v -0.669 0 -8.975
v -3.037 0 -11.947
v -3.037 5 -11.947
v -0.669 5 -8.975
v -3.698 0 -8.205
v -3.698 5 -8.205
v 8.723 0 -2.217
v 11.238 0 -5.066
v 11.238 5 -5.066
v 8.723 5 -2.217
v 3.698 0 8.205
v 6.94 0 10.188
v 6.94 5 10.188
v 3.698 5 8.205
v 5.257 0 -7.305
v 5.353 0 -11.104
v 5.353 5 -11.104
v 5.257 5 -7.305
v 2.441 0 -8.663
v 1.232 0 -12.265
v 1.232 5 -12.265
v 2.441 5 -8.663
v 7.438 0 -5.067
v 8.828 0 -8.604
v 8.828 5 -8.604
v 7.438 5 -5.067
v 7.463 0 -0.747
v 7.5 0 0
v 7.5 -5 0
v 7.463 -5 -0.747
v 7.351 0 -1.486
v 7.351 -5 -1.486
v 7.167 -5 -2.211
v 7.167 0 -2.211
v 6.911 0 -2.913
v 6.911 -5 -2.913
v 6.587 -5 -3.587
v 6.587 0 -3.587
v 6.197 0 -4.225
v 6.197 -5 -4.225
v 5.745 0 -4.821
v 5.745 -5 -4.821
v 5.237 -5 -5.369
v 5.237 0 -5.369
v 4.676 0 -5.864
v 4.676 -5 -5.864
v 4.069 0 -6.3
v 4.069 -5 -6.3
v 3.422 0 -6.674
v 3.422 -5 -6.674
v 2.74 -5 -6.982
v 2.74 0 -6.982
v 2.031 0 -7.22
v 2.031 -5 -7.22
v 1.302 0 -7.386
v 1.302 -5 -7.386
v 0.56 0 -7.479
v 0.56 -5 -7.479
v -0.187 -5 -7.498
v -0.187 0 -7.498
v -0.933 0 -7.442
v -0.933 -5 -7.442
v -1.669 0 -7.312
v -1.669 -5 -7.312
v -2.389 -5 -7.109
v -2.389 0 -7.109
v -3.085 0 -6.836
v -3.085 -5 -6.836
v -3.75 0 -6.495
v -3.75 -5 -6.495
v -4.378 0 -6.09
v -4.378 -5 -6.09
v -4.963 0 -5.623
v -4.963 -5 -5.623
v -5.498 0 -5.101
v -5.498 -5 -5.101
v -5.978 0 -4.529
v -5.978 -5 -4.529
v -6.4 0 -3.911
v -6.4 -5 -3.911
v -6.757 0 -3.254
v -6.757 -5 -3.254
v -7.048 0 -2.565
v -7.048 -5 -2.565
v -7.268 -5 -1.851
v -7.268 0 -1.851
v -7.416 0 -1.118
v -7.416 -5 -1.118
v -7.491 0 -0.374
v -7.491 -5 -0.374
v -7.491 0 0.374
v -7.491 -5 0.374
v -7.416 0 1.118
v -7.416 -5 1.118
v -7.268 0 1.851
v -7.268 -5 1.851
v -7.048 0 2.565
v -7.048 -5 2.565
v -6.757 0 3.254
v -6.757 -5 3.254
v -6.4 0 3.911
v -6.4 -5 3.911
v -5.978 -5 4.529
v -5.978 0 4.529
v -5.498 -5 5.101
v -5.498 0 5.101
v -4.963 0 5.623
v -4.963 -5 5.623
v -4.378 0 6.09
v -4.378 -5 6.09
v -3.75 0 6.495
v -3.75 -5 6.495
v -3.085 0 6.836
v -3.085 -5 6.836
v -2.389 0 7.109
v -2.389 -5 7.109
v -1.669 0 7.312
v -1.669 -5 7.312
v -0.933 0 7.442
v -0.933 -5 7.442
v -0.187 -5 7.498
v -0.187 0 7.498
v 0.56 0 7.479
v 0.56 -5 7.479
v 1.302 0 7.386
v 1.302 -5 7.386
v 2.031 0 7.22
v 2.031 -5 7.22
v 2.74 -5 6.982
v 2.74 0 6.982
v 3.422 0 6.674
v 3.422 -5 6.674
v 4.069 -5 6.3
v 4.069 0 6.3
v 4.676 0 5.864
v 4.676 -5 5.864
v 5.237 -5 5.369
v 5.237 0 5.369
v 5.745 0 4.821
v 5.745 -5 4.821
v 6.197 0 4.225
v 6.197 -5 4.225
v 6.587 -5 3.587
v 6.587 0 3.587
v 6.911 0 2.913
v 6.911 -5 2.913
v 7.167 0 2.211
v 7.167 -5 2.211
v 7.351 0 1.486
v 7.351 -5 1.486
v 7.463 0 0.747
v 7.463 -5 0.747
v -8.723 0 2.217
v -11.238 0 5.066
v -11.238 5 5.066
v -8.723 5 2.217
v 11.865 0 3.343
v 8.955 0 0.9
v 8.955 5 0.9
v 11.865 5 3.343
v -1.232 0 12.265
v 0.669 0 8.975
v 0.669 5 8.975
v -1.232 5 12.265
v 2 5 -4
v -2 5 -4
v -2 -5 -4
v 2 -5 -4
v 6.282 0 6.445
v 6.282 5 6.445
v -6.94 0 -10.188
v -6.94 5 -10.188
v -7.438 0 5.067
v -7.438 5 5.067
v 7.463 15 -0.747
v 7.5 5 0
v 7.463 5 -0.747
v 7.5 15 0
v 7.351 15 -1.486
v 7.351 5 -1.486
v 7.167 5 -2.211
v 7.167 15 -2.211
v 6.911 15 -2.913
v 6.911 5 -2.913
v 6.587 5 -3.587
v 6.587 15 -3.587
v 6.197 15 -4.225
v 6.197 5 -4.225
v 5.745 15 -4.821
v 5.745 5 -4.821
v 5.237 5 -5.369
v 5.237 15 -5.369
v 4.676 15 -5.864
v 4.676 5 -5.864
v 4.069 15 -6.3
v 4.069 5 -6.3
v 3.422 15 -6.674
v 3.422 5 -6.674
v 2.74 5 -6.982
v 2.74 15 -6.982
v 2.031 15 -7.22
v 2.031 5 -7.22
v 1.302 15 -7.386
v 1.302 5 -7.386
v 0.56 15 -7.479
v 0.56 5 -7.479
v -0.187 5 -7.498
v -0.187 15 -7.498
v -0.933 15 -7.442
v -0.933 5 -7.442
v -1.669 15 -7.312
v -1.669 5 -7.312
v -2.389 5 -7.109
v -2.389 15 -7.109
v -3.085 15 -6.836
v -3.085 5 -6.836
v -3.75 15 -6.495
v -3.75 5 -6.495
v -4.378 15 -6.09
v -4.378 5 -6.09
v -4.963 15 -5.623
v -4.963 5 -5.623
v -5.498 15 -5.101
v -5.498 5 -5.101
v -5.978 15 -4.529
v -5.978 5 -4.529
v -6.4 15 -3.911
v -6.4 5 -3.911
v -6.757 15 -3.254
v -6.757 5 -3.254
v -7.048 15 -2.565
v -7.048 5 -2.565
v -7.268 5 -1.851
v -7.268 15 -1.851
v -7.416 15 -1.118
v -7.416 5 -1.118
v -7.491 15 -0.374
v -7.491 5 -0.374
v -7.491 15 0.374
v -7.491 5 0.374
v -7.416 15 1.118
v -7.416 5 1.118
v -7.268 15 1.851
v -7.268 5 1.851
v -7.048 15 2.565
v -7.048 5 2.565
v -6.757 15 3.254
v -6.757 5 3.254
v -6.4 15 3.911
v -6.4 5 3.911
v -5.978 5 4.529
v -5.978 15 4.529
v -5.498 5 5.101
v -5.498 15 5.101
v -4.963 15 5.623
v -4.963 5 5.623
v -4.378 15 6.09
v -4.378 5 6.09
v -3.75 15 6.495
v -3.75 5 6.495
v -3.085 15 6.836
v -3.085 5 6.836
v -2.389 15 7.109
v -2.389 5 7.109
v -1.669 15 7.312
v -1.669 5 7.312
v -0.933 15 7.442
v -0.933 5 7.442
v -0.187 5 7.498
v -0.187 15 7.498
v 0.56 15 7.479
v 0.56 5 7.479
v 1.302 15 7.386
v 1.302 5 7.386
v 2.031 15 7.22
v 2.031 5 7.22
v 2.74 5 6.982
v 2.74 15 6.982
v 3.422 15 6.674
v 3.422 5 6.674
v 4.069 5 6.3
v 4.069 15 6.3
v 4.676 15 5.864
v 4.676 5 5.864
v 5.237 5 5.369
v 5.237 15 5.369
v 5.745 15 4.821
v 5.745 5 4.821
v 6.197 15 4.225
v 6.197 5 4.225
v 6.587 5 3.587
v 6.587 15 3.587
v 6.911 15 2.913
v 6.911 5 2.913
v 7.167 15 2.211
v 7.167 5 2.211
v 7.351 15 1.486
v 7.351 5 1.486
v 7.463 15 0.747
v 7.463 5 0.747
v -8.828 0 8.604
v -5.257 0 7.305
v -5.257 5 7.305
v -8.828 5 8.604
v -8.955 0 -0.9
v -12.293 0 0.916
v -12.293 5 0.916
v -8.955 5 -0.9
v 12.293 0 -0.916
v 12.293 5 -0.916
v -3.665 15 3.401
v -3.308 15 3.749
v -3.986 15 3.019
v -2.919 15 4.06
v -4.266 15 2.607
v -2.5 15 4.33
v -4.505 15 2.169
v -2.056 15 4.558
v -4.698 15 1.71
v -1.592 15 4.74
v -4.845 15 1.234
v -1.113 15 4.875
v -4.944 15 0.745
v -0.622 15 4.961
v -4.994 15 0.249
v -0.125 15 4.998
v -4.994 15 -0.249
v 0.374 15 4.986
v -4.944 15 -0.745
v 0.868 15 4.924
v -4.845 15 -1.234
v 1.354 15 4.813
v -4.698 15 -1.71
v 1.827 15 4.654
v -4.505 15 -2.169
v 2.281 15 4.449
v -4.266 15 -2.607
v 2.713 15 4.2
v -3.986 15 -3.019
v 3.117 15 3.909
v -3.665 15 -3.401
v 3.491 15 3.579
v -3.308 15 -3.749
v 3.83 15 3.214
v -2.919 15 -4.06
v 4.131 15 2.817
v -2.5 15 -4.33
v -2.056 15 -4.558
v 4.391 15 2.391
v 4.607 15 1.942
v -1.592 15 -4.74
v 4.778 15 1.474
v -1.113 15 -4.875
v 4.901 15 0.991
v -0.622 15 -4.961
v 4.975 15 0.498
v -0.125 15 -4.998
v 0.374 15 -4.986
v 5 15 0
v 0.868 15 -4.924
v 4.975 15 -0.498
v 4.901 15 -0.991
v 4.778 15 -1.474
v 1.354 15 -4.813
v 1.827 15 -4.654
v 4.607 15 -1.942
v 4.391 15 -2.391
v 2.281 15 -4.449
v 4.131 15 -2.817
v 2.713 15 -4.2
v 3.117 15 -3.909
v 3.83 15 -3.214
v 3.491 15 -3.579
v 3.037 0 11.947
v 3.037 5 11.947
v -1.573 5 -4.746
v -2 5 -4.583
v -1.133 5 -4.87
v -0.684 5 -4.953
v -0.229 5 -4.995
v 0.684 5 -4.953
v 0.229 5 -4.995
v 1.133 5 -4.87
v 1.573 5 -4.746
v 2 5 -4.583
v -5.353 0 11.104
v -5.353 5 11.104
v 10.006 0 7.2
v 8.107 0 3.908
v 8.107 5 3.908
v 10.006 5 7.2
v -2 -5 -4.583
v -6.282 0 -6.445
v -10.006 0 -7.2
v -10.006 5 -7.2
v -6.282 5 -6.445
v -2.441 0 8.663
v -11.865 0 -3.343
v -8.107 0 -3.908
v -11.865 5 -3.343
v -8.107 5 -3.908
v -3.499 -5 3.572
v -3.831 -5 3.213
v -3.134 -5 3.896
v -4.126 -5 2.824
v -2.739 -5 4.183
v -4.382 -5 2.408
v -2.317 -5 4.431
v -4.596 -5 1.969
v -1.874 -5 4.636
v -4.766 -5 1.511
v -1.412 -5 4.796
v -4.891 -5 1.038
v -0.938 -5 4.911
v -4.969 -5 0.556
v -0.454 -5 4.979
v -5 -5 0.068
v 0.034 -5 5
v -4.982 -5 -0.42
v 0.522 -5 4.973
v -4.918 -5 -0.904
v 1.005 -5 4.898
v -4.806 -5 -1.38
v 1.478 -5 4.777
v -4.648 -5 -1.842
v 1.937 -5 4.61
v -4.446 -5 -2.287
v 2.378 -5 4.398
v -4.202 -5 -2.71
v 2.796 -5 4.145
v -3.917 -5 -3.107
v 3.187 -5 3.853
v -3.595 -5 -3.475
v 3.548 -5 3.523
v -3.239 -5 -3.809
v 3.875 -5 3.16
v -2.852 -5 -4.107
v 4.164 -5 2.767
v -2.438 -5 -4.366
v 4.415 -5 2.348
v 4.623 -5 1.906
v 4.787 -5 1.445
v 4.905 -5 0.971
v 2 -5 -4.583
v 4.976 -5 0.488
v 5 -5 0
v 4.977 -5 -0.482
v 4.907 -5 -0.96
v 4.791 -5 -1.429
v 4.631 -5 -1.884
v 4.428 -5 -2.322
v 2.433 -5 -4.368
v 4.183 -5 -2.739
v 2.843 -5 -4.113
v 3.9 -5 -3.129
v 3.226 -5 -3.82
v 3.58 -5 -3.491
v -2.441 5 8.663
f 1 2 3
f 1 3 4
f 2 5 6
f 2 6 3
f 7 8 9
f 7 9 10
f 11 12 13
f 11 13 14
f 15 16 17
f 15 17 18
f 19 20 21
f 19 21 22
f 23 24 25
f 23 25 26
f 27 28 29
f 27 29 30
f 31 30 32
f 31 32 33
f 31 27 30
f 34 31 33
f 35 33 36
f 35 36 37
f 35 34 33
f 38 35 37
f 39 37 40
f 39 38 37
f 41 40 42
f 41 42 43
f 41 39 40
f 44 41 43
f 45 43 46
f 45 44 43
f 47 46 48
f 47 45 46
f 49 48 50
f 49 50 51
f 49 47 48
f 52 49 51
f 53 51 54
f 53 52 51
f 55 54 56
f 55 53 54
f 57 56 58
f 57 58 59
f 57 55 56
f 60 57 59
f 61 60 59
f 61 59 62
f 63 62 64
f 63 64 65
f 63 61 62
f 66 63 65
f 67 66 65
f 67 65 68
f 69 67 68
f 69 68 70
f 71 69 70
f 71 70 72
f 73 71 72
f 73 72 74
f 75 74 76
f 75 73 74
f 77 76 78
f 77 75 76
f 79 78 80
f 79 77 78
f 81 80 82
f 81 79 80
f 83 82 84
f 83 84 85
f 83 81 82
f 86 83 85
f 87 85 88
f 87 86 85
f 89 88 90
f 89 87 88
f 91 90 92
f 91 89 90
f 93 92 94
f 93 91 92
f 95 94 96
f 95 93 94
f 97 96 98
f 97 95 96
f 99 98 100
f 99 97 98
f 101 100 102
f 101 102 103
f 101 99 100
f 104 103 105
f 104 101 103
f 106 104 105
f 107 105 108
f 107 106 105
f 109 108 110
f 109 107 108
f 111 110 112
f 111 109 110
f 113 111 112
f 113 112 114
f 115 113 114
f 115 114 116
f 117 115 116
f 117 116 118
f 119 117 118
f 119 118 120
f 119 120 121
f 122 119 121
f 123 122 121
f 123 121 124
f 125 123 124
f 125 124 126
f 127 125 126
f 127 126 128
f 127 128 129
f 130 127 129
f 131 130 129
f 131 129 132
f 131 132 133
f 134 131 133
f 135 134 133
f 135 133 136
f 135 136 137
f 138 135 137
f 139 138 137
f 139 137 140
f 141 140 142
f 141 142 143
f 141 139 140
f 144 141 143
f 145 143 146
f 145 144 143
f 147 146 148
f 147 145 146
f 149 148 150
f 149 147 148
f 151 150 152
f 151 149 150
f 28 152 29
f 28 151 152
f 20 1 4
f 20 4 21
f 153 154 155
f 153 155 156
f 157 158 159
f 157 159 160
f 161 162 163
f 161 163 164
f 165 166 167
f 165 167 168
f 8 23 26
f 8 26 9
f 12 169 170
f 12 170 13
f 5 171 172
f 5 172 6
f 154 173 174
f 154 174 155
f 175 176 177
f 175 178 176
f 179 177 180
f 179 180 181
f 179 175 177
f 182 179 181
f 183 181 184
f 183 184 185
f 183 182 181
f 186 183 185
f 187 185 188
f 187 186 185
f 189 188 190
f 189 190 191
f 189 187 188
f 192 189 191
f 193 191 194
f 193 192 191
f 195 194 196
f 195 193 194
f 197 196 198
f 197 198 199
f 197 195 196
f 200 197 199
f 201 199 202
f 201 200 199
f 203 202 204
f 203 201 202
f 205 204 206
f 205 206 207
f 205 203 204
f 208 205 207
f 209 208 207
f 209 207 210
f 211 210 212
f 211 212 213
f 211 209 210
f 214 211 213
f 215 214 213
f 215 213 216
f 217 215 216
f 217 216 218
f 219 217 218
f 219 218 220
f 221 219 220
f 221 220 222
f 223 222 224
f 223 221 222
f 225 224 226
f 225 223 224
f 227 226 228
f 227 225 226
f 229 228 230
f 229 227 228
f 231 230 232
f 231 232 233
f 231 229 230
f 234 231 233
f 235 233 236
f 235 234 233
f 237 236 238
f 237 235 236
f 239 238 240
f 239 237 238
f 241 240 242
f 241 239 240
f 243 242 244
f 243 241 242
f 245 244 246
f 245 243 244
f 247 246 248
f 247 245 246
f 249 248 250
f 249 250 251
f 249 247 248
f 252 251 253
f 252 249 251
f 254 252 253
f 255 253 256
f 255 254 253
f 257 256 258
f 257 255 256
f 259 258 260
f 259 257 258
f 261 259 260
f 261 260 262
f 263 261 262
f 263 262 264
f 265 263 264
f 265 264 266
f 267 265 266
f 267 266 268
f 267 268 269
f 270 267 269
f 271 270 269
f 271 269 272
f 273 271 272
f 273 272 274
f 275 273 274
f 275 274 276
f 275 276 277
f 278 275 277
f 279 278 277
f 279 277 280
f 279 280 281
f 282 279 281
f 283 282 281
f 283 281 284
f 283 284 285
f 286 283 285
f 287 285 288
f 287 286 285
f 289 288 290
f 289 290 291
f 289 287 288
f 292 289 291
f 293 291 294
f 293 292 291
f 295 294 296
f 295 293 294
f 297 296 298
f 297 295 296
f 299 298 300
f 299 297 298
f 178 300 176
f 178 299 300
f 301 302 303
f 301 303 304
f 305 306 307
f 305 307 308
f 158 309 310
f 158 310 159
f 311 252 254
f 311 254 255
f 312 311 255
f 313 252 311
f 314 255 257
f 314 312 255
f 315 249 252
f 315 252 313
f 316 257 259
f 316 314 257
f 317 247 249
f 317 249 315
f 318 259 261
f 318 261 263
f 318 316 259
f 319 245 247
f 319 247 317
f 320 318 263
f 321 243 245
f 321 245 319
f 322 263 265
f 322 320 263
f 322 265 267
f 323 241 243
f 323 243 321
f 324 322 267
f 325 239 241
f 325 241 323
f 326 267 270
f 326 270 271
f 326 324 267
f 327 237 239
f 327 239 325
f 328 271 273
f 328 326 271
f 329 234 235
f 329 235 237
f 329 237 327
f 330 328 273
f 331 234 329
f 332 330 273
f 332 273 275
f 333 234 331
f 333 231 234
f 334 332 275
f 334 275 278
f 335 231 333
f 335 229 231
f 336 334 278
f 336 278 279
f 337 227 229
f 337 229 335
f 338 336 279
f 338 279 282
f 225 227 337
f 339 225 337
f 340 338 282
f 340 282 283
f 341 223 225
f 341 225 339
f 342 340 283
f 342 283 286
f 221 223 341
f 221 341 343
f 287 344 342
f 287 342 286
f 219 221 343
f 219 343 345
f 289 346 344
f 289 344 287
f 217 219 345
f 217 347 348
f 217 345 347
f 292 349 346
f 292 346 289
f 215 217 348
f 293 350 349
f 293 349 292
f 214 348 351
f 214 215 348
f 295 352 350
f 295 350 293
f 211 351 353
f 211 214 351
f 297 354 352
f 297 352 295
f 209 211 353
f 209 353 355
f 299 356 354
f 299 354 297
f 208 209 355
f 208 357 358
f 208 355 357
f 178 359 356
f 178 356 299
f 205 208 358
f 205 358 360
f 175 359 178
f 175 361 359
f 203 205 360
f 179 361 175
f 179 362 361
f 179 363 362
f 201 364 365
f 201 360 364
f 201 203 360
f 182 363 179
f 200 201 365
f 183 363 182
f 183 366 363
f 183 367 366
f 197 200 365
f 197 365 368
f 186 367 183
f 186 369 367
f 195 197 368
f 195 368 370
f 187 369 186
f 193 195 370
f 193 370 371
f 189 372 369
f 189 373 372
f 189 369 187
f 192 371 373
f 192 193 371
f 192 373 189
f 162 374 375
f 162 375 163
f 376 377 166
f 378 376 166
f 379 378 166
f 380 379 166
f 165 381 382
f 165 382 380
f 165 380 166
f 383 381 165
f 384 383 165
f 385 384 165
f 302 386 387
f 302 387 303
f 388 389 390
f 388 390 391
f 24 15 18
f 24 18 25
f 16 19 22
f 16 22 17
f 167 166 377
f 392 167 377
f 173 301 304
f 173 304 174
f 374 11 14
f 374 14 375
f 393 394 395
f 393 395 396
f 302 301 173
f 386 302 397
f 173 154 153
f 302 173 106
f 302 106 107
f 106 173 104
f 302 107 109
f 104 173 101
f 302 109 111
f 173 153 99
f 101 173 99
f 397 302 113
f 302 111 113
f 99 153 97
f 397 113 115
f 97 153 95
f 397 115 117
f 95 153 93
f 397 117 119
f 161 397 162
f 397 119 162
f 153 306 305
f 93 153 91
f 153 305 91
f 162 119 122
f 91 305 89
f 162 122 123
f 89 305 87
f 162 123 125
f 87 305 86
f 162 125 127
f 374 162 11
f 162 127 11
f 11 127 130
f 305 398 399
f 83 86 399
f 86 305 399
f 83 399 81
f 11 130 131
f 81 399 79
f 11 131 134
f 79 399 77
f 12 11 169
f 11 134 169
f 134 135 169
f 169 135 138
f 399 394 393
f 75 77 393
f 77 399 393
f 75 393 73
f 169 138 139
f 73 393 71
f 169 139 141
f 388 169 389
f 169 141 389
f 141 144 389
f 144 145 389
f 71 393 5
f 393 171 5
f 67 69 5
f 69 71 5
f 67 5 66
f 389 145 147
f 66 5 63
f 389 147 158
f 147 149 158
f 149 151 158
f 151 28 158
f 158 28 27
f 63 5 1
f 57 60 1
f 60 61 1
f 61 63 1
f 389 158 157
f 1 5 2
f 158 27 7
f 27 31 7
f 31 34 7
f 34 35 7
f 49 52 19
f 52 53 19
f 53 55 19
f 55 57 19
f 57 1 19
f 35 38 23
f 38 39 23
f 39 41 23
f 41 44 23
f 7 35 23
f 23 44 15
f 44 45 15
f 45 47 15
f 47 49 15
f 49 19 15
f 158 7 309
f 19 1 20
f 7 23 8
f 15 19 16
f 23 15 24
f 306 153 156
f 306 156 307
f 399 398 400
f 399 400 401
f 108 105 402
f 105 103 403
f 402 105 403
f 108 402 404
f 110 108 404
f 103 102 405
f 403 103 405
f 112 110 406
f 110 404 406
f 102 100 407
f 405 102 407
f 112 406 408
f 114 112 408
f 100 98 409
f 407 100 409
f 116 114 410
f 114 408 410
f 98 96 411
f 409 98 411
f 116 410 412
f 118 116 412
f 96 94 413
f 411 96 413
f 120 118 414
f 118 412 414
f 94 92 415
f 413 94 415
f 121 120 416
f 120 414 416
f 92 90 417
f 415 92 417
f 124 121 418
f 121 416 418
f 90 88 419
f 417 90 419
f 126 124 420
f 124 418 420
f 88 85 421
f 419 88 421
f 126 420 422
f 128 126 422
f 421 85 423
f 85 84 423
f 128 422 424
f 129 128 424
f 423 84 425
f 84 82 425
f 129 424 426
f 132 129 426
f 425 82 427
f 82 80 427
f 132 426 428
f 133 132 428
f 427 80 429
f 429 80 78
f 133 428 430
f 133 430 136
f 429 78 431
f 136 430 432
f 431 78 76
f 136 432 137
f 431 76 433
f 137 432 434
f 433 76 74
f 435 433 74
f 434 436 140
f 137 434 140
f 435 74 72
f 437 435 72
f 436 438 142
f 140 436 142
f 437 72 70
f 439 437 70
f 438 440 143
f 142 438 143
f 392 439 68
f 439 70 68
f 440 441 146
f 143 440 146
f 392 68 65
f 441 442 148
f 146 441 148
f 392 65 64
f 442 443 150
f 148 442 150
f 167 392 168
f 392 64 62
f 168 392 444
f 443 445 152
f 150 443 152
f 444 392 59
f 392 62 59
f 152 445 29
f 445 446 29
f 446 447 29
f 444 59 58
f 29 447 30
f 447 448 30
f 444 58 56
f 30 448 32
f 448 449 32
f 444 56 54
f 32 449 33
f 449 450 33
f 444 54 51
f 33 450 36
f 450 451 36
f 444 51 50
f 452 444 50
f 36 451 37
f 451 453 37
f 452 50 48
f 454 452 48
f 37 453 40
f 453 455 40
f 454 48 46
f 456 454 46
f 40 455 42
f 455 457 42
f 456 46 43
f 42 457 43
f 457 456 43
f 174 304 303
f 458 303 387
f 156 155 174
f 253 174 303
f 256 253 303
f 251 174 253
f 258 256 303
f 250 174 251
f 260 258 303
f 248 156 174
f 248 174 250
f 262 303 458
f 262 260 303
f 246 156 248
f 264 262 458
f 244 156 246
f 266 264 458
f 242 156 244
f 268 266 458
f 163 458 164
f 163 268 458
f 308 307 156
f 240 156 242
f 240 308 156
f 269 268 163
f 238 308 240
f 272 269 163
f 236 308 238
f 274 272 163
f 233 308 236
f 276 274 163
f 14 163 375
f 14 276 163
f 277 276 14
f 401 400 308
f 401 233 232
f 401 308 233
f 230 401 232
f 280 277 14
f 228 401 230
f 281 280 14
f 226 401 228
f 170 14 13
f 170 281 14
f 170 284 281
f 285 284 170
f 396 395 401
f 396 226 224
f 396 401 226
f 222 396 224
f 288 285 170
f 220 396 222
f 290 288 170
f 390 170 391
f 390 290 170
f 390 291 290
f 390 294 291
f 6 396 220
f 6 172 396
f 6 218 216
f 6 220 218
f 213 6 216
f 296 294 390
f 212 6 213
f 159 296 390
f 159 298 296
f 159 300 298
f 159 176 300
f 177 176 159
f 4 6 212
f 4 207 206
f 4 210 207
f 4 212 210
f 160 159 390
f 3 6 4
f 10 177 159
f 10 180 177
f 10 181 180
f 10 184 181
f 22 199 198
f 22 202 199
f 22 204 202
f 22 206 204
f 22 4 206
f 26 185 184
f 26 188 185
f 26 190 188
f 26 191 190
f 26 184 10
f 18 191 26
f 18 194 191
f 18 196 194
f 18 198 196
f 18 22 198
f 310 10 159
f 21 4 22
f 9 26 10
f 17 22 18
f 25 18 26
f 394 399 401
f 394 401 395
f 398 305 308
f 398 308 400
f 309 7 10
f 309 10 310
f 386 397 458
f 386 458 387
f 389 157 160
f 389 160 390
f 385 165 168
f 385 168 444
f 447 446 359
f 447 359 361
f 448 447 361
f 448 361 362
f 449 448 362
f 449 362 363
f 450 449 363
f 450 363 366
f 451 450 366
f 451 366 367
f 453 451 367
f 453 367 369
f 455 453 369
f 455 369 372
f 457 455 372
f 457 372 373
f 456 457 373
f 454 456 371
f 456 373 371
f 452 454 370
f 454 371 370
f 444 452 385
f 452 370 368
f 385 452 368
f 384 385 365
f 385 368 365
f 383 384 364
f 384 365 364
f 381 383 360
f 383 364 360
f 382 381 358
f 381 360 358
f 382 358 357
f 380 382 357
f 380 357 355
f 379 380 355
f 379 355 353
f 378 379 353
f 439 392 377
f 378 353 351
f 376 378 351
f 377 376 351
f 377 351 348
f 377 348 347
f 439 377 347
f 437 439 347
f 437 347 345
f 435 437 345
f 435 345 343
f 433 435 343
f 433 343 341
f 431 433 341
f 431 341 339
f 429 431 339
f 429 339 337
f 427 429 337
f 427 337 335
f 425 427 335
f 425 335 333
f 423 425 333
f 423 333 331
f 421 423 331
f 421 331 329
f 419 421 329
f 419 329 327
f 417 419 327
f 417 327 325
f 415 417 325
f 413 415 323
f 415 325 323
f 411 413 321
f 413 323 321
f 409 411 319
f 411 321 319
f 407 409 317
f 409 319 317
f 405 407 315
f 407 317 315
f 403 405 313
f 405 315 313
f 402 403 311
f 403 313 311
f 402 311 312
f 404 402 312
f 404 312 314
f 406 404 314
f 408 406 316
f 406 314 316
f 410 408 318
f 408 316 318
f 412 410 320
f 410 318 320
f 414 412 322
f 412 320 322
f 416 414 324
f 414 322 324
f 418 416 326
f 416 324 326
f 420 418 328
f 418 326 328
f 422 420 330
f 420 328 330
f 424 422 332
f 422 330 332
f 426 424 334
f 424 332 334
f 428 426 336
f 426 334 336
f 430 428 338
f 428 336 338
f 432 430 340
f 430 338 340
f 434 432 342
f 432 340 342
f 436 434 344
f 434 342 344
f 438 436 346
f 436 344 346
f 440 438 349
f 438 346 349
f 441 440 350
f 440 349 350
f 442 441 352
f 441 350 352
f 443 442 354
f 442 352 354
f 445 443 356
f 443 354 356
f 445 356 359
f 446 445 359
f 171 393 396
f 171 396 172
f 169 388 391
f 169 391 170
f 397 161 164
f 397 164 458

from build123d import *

# Parameters (mm, degrees)
SKETCH1_R           = 9
BOSS_EXTRUDE1_DEPTH = 5
SKETCH2_R           = 7.5
BOSS_EXTRUDE2_DEPTH = 10
SKETCH3_R           = 5
CUT_EXTRUDE1_DEPTH  = 20
SKETCH4_W           = 4
SKETCH4_H           = 2
BOSS_EXTRUDE3_DEPTH = 10


with BuildPart() as part:
    # Sketch1 → Boss-Extrude1 (new body)
    with BuildSketch(Plane(origin=(0, 0, 0), x_dir=(1, 0, 0), z_dir=(0, 1, 0))):
        Circle(SKETCH1_R)
        Polygon((-5.35288104, -11.104144955), (-5.256580304, -7.305365392), (-8.827904062, -8.603689933), (-7.438151841, -5.066941601), (-11.238151569, -5.065502929), (-8.72257249, -2.217369874), (-12.292912138, -0.916341513), (-8.954922165, 0.899649385), (-11.86496608, 3.343344214), (-8.107176067, 3.908157651), (-10.005930004, 7.199773285), (-6.281584886, 6.445284426), (-6.940031098, 10.187803442), (-3.698341861, 8.205014776), (-3.037062017, 11.947034147), (-0.669024226, 8.975099252), (1.232221565, 12.265276214), (2.440987604, 8.6626543), (5.35288104, 11.104144955), (5.256580304, 7.305365392), (8.827904062, 8.603689933), (7.438151841, 5.066941601), (11.238151569, 5.065502929), (8.72257249, 2.217369874), (12.292912138, 0.916341513), (8.954922165, -0.899649385), (11.86496608, -3.343344214), (8.107176067, -3.908157651), (10.005930004, -7.199773285), (6.281584886, -6.445284426), (6.940031098, -10.187803442), (3.698341861, -8.205014776), (3.037062017, -11.947034147), (0.669024226, -8.975099252), (-1.232221565, -12.265276214), (-2.440987604, -8.6626543), align=None)
    extrude(amount=BOSS_EXTRUDE1_DEPTH)

    # Sketch2 → Boss-Extrude2 (add, symmetric)
    with BuildSketch(Plane(origin=(0, 5, 0), x_dir=(1, 0, 0), z_dir=(0, 1, 0))):
        Circle(SKETCH2_R)
    extrude(amount=BOSS_EXTRUDE2_DEPTH, both=True)

    # Sketch3 → Cut-Extrude1 (cut)
    with BuildSketch(Plane(origin=(0, 15, 0), x_dir=(1, 0, 0), z_dir=(0, 1, 0))):
        Circle(SKETCH3_R)
    extrude(amount=-CUT_EXTRUDE1_DEPTH, mode=Mode.SUBTRACT)

    # Sketch4 → Boss-Extrude3 (add)
    with BuildSketch(Plane(origin=(0, 5, 0), x_dir=(1, 0, 0), z_dir=(0, 1, 0))):
        with Locations((0, 5)):
            Rectangle(SKETCH4_W, SKETCH4_H)
    extrude(amount=-BOSS_EXTRUDE3_DEPTH)


solid = part.part
